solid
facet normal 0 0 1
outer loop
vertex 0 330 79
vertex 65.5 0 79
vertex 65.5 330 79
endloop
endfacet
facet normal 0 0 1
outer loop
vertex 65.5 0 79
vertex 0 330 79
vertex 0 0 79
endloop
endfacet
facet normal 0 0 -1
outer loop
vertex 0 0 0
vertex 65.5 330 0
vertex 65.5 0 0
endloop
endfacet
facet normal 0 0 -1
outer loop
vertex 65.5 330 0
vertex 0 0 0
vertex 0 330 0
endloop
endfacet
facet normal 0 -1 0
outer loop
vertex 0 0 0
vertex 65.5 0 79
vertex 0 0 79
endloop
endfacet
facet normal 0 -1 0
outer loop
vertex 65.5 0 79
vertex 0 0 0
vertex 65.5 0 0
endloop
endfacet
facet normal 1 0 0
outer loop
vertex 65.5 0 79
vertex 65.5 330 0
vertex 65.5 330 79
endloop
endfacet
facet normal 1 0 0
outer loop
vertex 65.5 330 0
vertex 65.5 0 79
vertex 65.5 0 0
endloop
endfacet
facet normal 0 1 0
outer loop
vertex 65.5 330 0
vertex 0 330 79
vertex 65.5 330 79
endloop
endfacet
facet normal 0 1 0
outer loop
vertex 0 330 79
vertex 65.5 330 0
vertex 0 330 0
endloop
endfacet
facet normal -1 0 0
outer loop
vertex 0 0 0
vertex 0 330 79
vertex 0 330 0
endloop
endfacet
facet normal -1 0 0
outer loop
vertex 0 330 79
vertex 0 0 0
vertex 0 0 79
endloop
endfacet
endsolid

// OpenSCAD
module laundrytable(width = 330, depth = 65.5, height = 79)
{
    text_size = 5;
    row_step = 7;
    xmargin = 2;
    ystart = width - row_step;
    color([0.8,0.8,0.8, 0.6]) 
    cube([depth, width, height], center = false);
    
    color([0.5,0.5,0.1,1.0])
    {
        translate([xmargin,ystart,height]) 
        text("FRONT SHELF", size = text_size, 
            halign = "left",valign = "top");

        translate([xmargin,ystart-1*row_step,height]) 
        text("262 cm coco [2]", size = text_size, 
            halign = "left",valign = "top");

        translate([xmargin,ystart-2*row_step,height]) 
        text("202 cm coco [6]", size = text_size, 
            halign = "left",valign = "top");

        translate([xmargin,ystart-3*row_step,height]) 
        text("158.5 cm coco [2]", size = text_size, 
            halign = "left",valign = "top");

        translate([xmargin,ystart-4*row_step,height]) 
        text("115.5 cm coco [2]", size = text_size, 
            halign = "left",valign = "top");

        translate([xmargin,ystart-5*row_step,height]) 
        text("64 cm coco [4]", size = text_size, 
            halign = "left",valign = "top");
            
        translate([xmargin,ystart-6*row_step,height]) 
        text("62 cm coco [4]", size = text_size, 
            halign = "left",valign = "top");

        ystart2 = ystart-8*row_step;
        translate([xmargin,ystart2,height]) 
        text("DIVIDER SHELF", size = text_size, 
            halign = "left",valign = "top");
            
        translate([xmargin,ystart2-1*row_step,height]) 
        text("292.7 cm coco [4]", size = text_size, 
            halign = "left",valign = "top");
            
        translate([xmargin,ystart2-2*row_step,height]) 
        text("261 cm coco [4]", size = text_size, 
            halign = "left",valign = "top");
            
        translate([xmargin,ystart2-3*row_step,height]) 
        text("125 cm coco [6]", size = text_size, 
            halign = "left",valign = "top");
            
        ystart3 = ystart2-5*row_step;
        translate([xmargin,ystart3,height]) 
        text("BED", size = text_size, 
            halign = "left",valign = "top");
            
        translate([xmargin,ystart3-1*row_step,height]) 
        text("94 cm coco [5]", size = text_size, 
            halign = "left",valign = "top");
            
        translate([xmargin,ystart3-2*row_step,height]) 
        text("199.3 cm coco [2]", size = text_size, 
            halign = "left",valign = "top");

        translate([xmargin,ystart3-3*row_step,height]) 
        text("25.7 cm coco [2]", size = text_size, 
            halign = "left",valign = "top");
    } 
}        

laundrytable();
